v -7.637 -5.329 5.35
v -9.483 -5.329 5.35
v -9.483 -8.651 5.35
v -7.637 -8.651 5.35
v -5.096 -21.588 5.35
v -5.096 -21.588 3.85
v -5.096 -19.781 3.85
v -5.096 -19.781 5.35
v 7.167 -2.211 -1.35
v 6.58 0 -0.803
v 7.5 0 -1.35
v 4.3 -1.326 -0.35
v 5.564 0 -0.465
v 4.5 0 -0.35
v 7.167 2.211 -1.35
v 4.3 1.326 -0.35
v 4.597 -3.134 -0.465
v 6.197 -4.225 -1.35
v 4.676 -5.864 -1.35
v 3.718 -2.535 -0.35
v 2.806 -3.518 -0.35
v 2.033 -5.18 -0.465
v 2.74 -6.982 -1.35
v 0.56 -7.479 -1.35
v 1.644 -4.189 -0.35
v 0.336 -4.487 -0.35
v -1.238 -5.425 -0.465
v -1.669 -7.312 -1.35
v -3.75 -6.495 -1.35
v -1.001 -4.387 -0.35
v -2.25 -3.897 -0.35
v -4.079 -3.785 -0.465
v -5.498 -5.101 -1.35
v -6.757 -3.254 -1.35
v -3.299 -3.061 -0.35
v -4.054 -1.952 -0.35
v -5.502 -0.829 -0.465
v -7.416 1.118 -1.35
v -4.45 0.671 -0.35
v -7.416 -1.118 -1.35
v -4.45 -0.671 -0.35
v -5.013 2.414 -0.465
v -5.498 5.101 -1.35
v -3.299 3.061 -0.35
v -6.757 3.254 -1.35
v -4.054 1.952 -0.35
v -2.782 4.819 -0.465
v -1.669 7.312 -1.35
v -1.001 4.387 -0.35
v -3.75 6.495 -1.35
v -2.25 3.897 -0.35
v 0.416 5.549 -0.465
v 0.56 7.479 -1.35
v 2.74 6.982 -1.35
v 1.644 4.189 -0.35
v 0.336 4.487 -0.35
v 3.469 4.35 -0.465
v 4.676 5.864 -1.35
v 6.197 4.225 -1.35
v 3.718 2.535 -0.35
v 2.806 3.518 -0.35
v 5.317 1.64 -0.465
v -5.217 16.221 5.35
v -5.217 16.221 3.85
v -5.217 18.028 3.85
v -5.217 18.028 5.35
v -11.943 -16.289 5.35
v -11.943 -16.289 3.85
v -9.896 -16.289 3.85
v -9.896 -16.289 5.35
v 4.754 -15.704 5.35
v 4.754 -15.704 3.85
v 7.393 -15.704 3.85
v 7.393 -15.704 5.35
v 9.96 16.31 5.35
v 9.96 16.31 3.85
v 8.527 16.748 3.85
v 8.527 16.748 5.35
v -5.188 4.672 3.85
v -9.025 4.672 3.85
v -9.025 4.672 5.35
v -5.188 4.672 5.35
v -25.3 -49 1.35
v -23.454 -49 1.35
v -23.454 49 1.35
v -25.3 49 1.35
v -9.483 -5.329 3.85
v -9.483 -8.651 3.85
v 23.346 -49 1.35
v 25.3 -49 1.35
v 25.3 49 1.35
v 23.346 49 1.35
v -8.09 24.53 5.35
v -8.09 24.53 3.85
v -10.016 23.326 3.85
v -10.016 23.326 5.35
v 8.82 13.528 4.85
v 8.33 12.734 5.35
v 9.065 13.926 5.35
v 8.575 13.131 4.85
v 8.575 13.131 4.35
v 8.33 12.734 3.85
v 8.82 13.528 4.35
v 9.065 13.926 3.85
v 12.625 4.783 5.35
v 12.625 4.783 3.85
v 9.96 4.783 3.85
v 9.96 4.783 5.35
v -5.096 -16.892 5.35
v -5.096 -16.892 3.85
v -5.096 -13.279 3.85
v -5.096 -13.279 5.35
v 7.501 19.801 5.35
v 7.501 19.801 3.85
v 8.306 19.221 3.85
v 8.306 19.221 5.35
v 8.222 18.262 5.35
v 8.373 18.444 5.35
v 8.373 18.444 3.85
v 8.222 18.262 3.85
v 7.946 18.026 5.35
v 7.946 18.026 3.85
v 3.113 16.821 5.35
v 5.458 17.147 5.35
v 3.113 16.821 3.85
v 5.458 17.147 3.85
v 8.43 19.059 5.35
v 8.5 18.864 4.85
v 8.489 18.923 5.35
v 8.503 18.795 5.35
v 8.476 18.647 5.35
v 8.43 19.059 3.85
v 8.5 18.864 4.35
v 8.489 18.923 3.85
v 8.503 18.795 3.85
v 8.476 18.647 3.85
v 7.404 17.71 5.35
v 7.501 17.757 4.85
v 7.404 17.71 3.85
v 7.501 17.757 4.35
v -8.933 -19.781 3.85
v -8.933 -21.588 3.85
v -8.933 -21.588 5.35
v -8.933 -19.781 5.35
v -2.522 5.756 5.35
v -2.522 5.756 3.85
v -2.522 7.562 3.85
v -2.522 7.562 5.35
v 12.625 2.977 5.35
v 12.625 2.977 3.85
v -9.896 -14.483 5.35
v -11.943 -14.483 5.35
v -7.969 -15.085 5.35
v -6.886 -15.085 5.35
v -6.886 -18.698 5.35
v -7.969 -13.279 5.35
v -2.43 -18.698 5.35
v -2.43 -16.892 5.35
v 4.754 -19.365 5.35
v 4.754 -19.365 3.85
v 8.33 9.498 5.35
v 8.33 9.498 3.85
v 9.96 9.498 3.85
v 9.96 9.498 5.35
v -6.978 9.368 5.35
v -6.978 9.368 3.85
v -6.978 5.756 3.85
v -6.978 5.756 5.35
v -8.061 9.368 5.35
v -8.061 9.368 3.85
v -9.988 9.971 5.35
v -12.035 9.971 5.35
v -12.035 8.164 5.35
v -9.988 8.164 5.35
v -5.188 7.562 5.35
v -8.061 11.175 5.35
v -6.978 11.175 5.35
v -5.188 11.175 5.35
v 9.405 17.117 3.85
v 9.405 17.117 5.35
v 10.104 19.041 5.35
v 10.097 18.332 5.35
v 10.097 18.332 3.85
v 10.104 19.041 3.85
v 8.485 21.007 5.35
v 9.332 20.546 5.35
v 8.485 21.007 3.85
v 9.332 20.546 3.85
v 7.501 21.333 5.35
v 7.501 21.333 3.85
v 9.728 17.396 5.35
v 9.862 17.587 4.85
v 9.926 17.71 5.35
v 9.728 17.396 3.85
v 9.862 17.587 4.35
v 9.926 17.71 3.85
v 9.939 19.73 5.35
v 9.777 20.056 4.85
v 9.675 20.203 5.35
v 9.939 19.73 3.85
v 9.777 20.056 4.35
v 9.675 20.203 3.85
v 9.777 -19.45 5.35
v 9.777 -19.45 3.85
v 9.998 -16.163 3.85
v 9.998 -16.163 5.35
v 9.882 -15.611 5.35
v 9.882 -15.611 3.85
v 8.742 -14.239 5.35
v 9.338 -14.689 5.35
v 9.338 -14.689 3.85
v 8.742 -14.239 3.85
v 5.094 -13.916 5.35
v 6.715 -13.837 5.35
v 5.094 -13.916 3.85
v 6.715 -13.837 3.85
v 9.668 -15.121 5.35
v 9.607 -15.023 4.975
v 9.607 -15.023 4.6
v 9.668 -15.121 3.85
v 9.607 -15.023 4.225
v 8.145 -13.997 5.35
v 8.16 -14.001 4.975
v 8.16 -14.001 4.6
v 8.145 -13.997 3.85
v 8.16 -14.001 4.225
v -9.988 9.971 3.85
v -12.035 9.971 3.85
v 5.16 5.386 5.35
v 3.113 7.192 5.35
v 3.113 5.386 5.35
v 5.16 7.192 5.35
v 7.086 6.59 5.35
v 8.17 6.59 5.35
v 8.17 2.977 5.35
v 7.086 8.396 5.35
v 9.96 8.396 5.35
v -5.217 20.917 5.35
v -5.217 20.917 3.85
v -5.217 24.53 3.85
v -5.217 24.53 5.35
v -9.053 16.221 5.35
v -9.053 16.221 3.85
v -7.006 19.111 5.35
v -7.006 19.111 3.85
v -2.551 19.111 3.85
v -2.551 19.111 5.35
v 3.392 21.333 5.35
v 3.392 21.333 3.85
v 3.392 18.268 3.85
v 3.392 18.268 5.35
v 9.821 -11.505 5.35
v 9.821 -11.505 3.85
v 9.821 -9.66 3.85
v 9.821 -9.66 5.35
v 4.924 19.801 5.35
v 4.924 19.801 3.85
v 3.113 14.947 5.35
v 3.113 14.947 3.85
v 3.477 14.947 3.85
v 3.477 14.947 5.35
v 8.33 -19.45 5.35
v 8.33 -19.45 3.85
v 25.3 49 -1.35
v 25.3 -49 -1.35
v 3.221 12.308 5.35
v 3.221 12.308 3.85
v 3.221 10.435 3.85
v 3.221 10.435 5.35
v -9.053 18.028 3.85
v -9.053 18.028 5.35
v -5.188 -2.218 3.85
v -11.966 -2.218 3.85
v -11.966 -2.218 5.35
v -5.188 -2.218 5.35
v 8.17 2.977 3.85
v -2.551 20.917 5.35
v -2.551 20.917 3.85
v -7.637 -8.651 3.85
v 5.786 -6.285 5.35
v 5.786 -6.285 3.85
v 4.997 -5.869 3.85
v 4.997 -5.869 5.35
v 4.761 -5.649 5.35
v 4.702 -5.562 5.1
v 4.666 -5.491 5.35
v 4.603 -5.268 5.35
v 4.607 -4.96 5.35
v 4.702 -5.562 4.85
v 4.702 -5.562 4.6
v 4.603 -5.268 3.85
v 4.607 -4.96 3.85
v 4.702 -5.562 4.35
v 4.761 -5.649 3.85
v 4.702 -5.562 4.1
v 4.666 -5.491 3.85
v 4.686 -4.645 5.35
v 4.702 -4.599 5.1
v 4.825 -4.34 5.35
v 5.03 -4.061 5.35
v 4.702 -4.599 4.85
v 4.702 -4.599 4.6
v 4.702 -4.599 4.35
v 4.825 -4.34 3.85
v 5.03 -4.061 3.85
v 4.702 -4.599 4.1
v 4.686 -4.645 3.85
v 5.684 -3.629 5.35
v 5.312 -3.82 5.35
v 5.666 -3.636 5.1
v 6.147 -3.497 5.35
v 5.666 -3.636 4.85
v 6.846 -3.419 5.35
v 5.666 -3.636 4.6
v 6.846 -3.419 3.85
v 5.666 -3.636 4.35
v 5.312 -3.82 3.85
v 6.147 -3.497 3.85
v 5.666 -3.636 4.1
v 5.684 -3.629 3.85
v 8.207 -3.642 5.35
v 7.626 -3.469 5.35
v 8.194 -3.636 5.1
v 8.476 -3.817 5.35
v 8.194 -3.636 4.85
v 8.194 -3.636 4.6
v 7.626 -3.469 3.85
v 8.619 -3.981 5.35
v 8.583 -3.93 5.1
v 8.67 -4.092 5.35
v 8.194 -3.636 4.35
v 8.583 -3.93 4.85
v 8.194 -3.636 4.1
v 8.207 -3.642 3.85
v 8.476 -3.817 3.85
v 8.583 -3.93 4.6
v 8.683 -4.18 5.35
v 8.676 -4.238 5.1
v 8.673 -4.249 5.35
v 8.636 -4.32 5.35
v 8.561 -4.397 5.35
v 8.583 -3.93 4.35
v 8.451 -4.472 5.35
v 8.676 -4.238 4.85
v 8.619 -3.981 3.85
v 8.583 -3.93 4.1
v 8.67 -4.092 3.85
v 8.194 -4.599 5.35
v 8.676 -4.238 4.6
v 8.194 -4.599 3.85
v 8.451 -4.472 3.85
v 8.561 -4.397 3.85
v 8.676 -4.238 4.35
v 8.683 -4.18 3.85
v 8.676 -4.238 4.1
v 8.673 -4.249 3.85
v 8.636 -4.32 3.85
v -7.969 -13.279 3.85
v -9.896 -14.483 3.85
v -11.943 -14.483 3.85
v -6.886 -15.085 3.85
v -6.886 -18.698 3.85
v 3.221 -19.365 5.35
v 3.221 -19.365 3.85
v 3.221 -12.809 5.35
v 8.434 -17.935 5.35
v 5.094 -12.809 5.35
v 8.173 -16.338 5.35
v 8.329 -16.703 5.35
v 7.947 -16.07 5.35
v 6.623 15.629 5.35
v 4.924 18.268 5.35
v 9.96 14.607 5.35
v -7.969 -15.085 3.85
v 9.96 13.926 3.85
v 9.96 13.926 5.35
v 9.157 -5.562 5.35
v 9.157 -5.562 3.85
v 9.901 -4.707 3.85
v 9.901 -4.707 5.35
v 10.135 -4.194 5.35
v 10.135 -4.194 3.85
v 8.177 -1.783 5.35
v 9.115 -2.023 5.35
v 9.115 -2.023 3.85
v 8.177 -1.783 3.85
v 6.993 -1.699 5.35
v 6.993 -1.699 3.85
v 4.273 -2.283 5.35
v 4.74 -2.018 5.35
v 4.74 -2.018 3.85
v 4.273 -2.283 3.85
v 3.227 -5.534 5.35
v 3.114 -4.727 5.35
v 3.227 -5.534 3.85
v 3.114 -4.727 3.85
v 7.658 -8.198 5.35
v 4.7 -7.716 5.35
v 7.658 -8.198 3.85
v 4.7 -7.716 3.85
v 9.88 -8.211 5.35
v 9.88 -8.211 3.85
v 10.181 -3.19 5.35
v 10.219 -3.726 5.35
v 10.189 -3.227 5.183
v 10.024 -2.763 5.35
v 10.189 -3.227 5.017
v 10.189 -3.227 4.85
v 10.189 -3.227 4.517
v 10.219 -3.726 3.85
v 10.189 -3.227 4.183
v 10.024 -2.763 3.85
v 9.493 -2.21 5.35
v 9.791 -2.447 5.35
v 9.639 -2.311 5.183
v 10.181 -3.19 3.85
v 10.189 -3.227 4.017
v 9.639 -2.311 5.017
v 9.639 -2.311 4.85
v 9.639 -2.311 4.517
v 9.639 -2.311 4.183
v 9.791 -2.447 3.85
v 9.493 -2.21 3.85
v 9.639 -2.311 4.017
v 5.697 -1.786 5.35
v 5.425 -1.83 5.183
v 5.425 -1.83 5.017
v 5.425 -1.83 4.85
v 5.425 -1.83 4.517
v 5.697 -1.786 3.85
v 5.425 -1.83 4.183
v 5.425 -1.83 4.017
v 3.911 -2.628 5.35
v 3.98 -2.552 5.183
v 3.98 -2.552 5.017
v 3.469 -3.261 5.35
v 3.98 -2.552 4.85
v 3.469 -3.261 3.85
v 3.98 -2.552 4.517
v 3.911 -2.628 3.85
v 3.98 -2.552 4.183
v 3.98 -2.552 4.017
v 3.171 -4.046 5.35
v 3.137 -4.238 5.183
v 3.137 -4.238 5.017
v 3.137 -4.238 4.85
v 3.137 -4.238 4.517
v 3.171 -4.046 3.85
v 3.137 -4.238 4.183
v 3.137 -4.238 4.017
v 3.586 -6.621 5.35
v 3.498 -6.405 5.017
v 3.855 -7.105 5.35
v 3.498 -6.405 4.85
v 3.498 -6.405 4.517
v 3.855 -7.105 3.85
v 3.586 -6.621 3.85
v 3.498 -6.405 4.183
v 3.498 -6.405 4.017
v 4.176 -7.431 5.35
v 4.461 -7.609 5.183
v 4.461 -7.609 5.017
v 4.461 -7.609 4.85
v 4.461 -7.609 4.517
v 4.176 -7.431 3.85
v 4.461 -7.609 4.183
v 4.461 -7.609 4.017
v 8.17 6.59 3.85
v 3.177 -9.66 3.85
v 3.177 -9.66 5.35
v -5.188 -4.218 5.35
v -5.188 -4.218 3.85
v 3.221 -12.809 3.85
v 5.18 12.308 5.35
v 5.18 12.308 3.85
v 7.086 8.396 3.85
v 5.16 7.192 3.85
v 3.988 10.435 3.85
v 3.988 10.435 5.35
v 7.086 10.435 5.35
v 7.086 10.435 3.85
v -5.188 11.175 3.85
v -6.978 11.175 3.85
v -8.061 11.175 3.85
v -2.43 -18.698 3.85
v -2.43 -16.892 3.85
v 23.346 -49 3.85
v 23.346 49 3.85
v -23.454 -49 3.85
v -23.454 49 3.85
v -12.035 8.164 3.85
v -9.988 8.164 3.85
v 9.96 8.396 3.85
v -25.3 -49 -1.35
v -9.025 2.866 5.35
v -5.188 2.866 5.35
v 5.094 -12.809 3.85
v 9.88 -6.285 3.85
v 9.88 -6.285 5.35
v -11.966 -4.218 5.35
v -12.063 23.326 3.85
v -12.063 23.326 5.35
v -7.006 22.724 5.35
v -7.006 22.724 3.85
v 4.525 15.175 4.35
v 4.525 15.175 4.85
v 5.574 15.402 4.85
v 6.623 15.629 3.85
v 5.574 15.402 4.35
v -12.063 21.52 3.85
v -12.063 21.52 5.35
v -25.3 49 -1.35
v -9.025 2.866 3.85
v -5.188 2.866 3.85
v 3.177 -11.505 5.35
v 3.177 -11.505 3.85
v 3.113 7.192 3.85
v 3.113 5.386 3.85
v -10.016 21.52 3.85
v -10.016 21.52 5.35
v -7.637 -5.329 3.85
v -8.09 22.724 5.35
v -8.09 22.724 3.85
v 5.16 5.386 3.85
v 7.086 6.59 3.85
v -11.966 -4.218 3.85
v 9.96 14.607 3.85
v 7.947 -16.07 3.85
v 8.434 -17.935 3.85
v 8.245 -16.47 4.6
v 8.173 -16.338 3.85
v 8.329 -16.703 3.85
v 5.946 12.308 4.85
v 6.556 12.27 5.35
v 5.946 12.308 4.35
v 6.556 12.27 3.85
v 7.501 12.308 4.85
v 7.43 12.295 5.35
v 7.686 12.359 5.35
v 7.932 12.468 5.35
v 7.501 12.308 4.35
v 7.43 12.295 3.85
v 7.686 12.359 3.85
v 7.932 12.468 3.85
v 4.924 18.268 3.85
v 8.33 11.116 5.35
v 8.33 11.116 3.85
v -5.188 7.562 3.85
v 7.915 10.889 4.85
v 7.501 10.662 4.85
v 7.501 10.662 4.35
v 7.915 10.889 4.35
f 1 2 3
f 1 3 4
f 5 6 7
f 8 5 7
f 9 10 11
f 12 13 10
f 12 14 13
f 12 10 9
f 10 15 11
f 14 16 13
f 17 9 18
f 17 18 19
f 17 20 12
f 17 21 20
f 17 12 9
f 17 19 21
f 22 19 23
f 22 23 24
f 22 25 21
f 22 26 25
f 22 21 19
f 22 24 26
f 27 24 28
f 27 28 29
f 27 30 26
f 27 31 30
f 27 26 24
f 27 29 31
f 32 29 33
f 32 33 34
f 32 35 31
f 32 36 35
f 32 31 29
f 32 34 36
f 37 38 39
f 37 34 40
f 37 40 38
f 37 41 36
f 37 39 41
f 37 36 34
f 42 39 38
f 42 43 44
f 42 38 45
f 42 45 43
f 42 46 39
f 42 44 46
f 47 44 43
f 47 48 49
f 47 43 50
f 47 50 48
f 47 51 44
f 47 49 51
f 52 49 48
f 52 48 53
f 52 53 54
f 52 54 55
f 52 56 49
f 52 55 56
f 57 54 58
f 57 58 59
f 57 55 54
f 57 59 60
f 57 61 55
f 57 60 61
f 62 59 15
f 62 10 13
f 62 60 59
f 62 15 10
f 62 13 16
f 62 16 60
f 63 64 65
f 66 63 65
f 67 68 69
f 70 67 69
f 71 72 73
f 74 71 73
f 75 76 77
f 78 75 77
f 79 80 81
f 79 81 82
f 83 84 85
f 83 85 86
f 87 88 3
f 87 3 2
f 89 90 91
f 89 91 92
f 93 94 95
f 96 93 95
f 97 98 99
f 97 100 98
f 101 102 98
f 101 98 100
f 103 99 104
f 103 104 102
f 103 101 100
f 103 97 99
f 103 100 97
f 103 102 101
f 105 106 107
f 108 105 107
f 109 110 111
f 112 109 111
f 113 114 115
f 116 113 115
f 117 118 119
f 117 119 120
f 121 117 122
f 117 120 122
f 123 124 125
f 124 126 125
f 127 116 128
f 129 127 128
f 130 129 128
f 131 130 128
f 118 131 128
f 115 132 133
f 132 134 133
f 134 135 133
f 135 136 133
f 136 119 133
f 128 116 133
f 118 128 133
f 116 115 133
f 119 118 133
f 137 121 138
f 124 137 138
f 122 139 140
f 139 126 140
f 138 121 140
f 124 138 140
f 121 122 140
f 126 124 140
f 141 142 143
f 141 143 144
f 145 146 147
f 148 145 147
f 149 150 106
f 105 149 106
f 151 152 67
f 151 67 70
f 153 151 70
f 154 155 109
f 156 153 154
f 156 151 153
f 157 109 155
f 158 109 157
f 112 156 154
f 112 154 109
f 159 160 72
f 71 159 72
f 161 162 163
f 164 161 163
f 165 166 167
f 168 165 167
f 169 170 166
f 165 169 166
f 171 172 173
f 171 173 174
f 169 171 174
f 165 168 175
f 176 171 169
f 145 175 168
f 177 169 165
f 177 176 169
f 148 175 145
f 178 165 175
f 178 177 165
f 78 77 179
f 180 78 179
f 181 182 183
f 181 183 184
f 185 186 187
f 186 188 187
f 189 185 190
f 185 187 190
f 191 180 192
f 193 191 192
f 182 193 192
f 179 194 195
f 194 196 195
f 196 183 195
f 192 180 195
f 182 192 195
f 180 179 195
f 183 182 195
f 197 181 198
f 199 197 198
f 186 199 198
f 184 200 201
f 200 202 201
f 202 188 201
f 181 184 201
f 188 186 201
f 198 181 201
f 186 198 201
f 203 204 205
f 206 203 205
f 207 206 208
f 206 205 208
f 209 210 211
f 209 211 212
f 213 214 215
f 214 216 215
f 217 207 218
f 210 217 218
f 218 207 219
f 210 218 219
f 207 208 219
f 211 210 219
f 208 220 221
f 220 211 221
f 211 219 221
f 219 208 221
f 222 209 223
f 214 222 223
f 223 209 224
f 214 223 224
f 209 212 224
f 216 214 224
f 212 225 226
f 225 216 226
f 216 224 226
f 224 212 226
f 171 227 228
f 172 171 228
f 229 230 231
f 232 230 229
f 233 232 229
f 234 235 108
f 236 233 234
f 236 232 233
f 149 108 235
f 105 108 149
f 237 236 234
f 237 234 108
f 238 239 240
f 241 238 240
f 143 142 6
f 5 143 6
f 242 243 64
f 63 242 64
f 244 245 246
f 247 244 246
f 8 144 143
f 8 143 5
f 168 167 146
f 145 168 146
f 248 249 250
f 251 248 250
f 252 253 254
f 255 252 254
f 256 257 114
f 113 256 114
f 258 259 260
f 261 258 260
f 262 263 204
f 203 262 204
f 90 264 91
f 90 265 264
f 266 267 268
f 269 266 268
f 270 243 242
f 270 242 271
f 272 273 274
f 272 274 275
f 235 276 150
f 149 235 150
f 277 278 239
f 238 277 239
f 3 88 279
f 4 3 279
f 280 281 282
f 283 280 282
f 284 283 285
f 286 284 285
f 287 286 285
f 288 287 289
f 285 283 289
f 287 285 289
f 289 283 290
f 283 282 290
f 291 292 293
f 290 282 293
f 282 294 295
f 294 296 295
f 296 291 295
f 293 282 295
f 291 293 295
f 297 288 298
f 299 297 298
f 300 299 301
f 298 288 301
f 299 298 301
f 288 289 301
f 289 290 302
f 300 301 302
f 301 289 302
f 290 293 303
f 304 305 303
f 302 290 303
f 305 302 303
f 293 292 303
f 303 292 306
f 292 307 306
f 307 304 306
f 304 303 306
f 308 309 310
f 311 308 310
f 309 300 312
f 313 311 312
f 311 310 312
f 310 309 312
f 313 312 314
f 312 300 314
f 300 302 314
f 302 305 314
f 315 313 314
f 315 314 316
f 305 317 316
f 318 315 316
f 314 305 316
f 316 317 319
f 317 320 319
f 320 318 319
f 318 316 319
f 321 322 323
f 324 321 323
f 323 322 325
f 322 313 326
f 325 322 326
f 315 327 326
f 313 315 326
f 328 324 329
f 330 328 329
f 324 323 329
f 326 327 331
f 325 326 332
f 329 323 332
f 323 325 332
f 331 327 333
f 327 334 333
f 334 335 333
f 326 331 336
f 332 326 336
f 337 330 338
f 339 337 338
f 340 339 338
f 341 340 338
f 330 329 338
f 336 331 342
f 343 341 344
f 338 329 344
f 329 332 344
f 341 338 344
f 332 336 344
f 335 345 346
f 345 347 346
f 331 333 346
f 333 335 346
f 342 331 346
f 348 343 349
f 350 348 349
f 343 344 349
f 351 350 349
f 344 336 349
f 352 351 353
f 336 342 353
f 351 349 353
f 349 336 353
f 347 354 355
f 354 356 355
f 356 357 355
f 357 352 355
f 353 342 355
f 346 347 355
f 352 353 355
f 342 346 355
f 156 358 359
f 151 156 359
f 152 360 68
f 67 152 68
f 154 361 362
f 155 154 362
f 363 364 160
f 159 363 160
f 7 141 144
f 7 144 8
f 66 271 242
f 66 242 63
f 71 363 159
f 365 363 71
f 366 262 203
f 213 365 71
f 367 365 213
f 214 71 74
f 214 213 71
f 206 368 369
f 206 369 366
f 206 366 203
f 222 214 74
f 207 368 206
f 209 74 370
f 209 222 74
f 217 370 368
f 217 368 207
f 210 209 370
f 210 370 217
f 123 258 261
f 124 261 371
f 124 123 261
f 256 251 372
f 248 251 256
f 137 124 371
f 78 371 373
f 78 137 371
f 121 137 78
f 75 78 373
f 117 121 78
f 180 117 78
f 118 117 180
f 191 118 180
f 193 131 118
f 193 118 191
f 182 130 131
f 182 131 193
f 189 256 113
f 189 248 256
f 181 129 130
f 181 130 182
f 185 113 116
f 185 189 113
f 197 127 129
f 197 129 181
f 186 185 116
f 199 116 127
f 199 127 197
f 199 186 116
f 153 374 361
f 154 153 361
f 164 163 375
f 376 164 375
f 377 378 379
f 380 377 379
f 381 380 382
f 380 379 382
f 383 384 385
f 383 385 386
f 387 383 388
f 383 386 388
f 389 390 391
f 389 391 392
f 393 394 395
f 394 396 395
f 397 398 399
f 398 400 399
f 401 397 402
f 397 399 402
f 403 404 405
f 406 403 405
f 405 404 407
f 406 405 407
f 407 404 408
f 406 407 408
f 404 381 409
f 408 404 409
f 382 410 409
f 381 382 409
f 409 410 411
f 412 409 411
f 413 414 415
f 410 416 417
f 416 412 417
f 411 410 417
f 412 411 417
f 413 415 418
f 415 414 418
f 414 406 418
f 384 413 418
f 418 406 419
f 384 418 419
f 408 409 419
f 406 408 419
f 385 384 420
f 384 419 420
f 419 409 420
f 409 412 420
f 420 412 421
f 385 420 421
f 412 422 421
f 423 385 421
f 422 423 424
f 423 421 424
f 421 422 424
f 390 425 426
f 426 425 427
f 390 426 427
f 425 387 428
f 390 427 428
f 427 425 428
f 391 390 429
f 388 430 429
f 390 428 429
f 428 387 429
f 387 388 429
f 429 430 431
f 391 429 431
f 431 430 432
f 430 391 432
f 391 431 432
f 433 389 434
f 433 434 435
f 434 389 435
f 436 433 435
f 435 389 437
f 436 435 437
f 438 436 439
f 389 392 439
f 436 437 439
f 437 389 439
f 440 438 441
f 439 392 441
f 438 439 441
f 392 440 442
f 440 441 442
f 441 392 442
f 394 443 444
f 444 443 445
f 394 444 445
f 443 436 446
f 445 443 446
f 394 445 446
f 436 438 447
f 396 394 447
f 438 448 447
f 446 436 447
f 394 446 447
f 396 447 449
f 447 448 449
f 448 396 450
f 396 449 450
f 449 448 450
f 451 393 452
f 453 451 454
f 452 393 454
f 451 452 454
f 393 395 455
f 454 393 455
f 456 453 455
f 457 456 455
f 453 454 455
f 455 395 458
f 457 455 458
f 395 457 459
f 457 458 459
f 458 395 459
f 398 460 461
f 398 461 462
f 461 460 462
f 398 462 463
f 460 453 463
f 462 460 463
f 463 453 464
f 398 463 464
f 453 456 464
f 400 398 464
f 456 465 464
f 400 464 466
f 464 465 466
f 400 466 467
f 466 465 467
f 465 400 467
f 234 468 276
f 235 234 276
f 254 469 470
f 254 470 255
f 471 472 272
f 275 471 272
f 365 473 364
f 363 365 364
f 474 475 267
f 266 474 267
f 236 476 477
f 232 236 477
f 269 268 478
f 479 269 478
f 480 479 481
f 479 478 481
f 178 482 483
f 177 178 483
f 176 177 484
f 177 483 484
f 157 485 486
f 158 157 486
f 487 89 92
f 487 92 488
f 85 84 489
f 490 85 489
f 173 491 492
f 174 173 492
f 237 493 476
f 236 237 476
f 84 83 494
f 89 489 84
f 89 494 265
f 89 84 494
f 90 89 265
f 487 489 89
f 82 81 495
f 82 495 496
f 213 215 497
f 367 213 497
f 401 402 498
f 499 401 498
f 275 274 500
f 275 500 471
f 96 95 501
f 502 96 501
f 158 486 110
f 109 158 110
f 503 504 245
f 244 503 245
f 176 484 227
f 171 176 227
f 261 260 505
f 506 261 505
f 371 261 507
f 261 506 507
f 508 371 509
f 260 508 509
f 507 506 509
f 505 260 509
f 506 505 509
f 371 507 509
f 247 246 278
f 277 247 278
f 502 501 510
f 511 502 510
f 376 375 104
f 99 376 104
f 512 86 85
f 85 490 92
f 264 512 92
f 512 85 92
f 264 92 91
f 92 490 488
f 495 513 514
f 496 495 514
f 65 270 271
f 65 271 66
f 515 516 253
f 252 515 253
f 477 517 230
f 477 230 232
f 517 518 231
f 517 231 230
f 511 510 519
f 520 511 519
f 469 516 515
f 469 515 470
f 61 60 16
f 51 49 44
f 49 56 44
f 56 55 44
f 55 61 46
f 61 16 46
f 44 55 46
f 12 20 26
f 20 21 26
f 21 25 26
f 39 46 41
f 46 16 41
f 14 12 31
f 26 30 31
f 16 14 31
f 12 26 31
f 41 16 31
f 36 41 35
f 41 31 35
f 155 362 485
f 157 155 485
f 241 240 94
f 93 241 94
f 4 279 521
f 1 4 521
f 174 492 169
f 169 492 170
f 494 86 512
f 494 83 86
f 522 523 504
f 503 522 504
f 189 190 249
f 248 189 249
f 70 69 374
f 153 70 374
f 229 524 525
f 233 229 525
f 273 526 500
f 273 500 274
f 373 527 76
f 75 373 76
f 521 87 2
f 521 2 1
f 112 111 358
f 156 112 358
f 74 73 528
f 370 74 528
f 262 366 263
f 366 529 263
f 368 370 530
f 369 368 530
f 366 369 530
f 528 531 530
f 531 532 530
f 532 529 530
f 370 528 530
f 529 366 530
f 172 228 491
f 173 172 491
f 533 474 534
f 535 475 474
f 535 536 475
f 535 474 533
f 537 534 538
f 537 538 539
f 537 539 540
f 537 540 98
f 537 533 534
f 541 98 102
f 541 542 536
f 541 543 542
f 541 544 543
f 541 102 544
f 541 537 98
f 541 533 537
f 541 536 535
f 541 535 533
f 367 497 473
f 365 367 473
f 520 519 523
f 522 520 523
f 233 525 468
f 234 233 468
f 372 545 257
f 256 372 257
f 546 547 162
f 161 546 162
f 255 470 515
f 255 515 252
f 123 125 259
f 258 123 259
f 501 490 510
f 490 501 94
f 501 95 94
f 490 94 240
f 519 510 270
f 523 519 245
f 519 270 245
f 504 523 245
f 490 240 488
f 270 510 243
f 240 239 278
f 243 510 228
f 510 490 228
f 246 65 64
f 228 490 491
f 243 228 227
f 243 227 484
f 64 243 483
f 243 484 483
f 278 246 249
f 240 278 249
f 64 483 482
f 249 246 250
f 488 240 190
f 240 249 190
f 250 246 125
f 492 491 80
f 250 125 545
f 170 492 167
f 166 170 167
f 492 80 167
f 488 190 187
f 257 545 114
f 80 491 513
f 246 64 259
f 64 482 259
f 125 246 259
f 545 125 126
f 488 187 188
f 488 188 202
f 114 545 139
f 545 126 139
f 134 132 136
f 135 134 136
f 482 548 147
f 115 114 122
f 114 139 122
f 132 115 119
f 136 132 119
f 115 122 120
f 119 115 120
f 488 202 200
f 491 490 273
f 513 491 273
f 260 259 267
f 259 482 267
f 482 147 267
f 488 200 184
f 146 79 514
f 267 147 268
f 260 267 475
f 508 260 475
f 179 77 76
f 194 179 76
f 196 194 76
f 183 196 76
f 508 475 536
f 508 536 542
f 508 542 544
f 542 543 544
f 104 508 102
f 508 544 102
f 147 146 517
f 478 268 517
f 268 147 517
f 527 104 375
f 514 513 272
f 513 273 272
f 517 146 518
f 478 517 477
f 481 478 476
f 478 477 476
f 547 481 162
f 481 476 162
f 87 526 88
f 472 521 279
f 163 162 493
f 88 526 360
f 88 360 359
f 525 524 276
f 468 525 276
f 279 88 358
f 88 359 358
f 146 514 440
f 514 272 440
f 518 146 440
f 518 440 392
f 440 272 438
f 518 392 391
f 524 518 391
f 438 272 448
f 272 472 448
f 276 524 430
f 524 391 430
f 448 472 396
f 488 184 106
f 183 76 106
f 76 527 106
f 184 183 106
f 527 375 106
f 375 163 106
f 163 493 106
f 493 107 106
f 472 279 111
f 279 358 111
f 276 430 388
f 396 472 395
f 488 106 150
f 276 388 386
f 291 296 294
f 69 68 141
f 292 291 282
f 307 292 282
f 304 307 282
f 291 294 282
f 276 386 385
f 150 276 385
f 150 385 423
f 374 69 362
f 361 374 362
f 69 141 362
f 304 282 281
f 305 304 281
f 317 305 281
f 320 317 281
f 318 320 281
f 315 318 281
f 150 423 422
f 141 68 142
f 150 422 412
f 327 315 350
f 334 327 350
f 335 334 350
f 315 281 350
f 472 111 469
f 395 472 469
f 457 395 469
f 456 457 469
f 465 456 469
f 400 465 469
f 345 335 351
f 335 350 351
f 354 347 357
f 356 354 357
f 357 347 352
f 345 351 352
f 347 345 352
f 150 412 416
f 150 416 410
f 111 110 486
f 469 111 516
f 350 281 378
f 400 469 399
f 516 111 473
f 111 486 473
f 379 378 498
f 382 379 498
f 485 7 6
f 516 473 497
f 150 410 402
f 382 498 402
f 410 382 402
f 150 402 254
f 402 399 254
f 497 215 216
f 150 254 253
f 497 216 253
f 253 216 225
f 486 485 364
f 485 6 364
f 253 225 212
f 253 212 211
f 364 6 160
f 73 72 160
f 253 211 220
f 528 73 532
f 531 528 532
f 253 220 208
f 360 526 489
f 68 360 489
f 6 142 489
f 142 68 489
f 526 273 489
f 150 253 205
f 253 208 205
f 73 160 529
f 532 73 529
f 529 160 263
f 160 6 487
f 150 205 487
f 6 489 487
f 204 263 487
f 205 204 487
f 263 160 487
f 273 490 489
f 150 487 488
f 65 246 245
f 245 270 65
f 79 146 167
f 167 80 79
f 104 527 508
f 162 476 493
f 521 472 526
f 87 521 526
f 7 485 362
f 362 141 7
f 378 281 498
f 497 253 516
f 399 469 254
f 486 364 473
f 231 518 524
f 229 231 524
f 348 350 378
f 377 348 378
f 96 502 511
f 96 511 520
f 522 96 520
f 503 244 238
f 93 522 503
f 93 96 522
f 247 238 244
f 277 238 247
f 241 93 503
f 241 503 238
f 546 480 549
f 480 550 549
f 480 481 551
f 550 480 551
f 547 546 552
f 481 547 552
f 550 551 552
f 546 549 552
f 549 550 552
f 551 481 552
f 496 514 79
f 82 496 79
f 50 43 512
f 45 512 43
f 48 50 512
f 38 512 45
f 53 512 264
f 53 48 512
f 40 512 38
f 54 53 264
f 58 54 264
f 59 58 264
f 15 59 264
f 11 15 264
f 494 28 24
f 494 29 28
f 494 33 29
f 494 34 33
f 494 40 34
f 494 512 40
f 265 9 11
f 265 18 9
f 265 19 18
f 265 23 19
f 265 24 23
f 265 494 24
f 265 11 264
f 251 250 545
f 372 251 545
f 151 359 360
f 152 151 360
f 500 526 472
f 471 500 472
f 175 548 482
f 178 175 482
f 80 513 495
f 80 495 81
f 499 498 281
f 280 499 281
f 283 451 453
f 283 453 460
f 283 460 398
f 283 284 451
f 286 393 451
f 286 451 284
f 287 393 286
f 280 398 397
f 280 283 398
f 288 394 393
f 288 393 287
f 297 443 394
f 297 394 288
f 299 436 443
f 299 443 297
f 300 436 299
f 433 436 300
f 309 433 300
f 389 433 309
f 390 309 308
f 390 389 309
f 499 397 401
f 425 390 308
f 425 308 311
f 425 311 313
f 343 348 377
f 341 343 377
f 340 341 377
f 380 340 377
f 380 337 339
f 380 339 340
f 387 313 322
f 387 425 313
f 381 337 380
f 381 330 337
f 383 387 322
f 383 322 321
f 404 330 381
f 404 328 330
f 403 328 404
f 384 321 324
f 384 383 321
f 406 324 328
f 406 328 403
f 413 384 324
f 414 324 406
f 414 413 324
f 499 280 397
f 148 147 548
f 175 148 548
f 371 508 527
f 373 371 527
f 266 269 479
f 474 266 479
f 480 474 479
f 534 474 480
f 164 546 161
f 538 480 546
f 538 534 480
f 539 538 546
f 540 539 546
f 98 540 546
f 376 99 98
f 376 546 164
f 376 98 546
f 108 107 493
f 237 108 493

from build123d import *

# Parameters (mm, degrees)
F0_W     = 46.8
F0_H     = 2.5
F1_DEPTH = 49
F2_W     = 7.5
F2_H     = 1
F5_W     = 2.0469846204
F5_H     = 1.8061620649
F5_W_2   = 6.6439194979
F5_H_2   = 1.8455331939
F5_W_3   = 3.8363870533
F5_H_3   = 1.8061622977
F5_W_4   = 1.0836967267
F5_W_5   = 6.7777763455
F5_H_4   = 2
F5_W_6   = 1.8455331939
F5_H_5   = 3.3219597489
F6_DEPTH = 1.5


# Not quite as in the source:
# - a fillet or chamfer that OpenCascade refuses, or shapes differently, is made with other operations: its cross-section is extruded or revolved along the edge and cut away or added


with BuildPart() as f1:
    # F0 (on Front) → F1 (new body, symmetric)
    with BuildSketch(Plane.XZ):
        Polygon((25.3, -1.35), (25.3, 1.35), (23.3460554371, 1.35), (-23.4539445629, 1.35), (-25.3, 1.35), (-25.3, -1.35), align=None)
        with Locations((-0.0539445629, 2.6)):
            Rectangle(F0_W, F0_H)
    extrude(amount=F1_DEPTH, both=True)

    # F2 (on Front) → F3 (revolve, cut)
    with BuildSketch(Plane.XZ):
        with Locations((3.75, -0.85)):
            Rectangle(F2_W, F2_H)
    revolve(axis=Axis((0, 0, -0.85), (0, 0, -1)), mode=Mode.SUBTRACT)

    # F4: fillet of radius 5 on 1 edges, made by hand

    # F4_s1 → F4_t2 (revolve)
    with BuildSketch(Plane.XZ):
        with BuildLine():
            ThreePointArc((7.5, -1.35), (6.0811388301, -0.6065835097), (4.5, -0.35))
            Line((4.5, -0.35), (7.5, -0.35))
            Line((7.5, -0.35), (7.5, -1.35))
        make_face()
    revolve(axis=Axis((0, 0, -0.35), (0, 0, -1)))

    # F5 (on face) → F6 (join)
    with BuildSketch(Plane.XY.offset(3.85)):
        with BuildLine():
            Line((4.9241716042, 19.8006471619), (7.5009630335, 19.8006471619))
            add(Edge.make_bspline(
                [(7.5009630335, 19.8006471619), (7.9785124596, 19.5075781217), (8.9543671976, 18.9087022865), (7.3816458851, 17.3276064651), (4.7697273037, 17.0174018652), (3.1129348501, 16.8206328526)],
                knots=[0, 0, 0, 0, 0.2595051335, 0.5302892228, 1, 1, 1, 1], degree=3))
            Line((3.1129348501, 16.8206328526), (3.1129348501, 14.9474805221))
            Line((3.1129348501, 14.9474805221), (3.4767354373, 14.9474805221))
            add(Edge.make_bspline(
                [(3.4767354373, 14.9474805221), (4.5253869977, 15.1745288943), (5.5740385582, 15.4015772666), (6.6226901187, 15.6286256388)],
                knots=[0, 0, 0, 0, 3.2188490998, 3.2188490998, 3.2188490998, 3.2188490998], degree=3))
            Line((6.6226901187, 15.6286256388), (9.9595930205, 14.6069070324))
            Line((9.9595930205, 14.6069070324), (9.9595930205, 16.3097716868))
            Line((9.9595930205, 16.3097716868), (8.527294053, 16.7483240055))
            add(Edge.make_bspline(
                [(8.527294053, 16.7483240055), (9.0505266558, 16.9185557016), (10.2287332466, 17.301880642), (10.2116405832, 20.5168892904), (8.4127583201, 21.0586346497), (7.5009630335, 21.3332278654)],
                knots=[0, 0, 0, 0, 0.2826109345, 0.6363786658, 1, 1, 1, 1], degree=3))
            Line((7.5009630335, 21.3332278654), (3.3915922977, 21.3332278654))
            Line((3.3915922977, 21.3332278654), (3.3915922977, 18.2680701837))
            Line((3.3915922977, 18.2680701837), (4.9241716042, 18.2680701837))
            Line((4.9241716042, 18.2680701837), (4.9241716042, 19.8006471619))
        make_face()
        with BuildLine():
            Line((5.1796017215, 12.3080369085), (3.2213055529, 12.3080369085))
            Line((3.2213055529, 12.3080369085), (3.2213055529, 10.434884578))
            Line((3.2213055529, 10.434884578), (3.987595439, 10.434884578))
            add(Edge.make_bspline(
                [(7.0864924639, 10.434884578), (6.6226901187, 10.434884578), (5.6548767314, 10.434884578), (4.5585386607, 10.434884578), (3.987595439, 10.434884578)],
                knots=[0, 0, 0, 0, 0.4792270404, 1, 1, 1, 1], degree=3))
            add(Edge.make_bspline(
                [(7.0864924639, 10.434884578), (7.5009630335, 10.6619332607), (7.915433603, 10.8889819433), (8.3299041726, 11.116030626)],
                knots=[0, 0, 0, 0, 1.4177561906, 1.4177561906, 1.4177561906, 1.4177561906], degree=3))
            Line((8.3299041726, 11.116030626), (8.3299041726, 12.7337537706))
            add(Edge.make_bspline(
                [(5.1796017215, 12.3080369085), (5.4034691903, 12.3161910935), (5.946247887, 12.3359613528), (7.5456770883, 12.1555160266), (8.0916682054, 12.558094155), (8.3299041726, 12.7337537706)],
                knots=[0, 0, 0, 0, 0.2835019002, 0.6873655771, 1, 1, 1, 1], degree=3))
        make_face()
        with BuildLine():
            add(Edge.make_bspline(
                [(8.3299041726, 12.7337537706), (8.5748998169, 13.1310888877), (8.8198954612, 13.5284240047), (9.0648911056, 13.9257591218)],
                knots=[0, 0, 0, 0, 1.4003865712, 1.4003865712, 1.4003865712, 1.4003865712], degree=3))
            Line((8.3299041726, 12.7337537706), (8.3299041726, 11.116030626))
            Line((8.3299041726, 11.116030626), (8.3299041726, 9.4983074814))
            Line((8.3299041726, 9.4983074814), (9.0648911056, 9.4983074814))
            Line((9.0648911056, 9.4983074814), (9.9595930205, 9.4983074814))
            Line((9.9595930205, 9.4983074814), (9.9595930205, 13.9257591218))
            Line((9.9595930205, 13.9257591218), (9.0648911056, 13.9257591218))
        make_face()
        Polygon((8.1701891906, 8.3958084671), (7.0864924639, 8.3958084671), (5.1599194705, 7.1917017432), (5.1599194705, 5.3855396783), (7.0864924639, 6.5896464022), (8.1701891906, 6.5896464022), align=None)
        with Locations((4.1364271603, 6.2886207107)):
            Rectangle(F5_W, F5_H)
        Polygon((9.9595930205, 8.3958084671), (8.1701891906, 8.3958084671), (8.1701891906, 6.5896464022), (8.1701891906, 4.7834843373), (9.9595930205, 4.7834843373), align=None)
        Polygon((12.62538982, 4.7834843373), (9.9595930205, 4.7834843373), (8.1701891906, 4.7834843373), (8.1701891906, 2.9773220395), (12.62538982, 2.9773220395), align=None)
        with BuildLine():
            Line((8.1941955723, -4.5991633087), (9.157482069, -5.5624498054))
            add(Edge.make_bspline(
                [(9.157482069, -5.5624498054), (9.5487792454, -5.1790893624), (10.3709560961, -4.3735888355), (10.1809148183, -1.5911495575), (5.2901881268, -1.6214904462), (3.9387879664, -2.4019349259), (2.8327143669, -4.2152866088), (3.4405306211, -6.4549250287), (4.2493320025, -7.9388718891), (8.0091011439, -8.2673740434), (9.3225151381, -8.2281395815), (9.8799471743, -8.2114879042)],
                knots=[0, 0, 0, 0, 0.0955972377, 0.2008648172, 0.3547140558, 0.449658727, 0.5522106806, 0.6629402054, 0.7557007662, 0.8963158456, 1, 1, 1, 1], degree=3))
            Line((9.8799471743, -8.2114879042), (9.8799471743, -6.2849144451))
            Line((9.8799471743, -6.2849144451), (9.639125783, -6.2849144451))
            Line((9.639125783, -6.2849144451), (5.7859793305, -6.2849144451))
            add(Edge.make_bspline(
                [(5.7859793305, -6.2849144451), (5.3373815573, -6.0824238319), (4.5029895973, -5.7057912452), (4.6151304787, -4.5054927526), (5.5221677114, -3.357555761), (8.2143823017, -3.3336799886), (8.8829973904, -4.2841414137), (8.4141443171, -4.4985702665), (8.1941955723, -4.5991633087)],
                knots=[0, 0, 0, 0, 0.1746613826, 0.3248702113, 0.5034996406, 0.7468657523, 0.8812494506, 1, 1, 1, 1], degree=3))
        make_face()
        with Locations((6.4990330953, -10.5825328623)):
            Rectangle(F5_W_2, F5_H_2)
        with BuildLine():
            Line((5.094458349, -12.8092374653), (3.2213055529, -12.8092374653))
            Line((3.2213055529, -12.8092374653), (3.2213055529, -19.3652724847))
            Line((3.2213055529, -19.3652724847), (4.753885325, -19.3652724847))
            Line((4.753885325, -19.3652724847), (4.753885325, -15.7041111961))
            Line((4.753885325, -15.7041111961), (7.393327076, -15.7041111961))
            add(Edge.make_bspline(
                [(7.393327076, -15.7041111961), (7.7280745564, -15.8906025071), (8.6028551514, -16.3779518959), (8.4340893146, -18.2776591394), (8.3299041726, -19.4504158571)],
                knots=[0, 0, 0, 0, 0.3826645017, 1, 1, 1, 1], degree=3))
            Line((8.3299041726, -19.4504158571), (9.777339641, -19.4504158571))
            add(Edge.make_bspline(
                [(9.777339641, -19.4504158571), (9.916282957, -18.4574178062), (10.1622140126, -16.6998013476), (9.7862090494, -14.9229979542), (8.1515194, -13.6961261057), (6.2020376655, -13.8364032587), (5.094458349, -13.9161003754)],
                knots=[0, 0, 0, 0, 0.2773941316, 0.4909903808, 0.7108110755, 1, 1, 1, 1], degree=3))
            Line((5.094458349, -13.9161003754), (5.094458349, -12.8092374653))
        make_face()
        Polygon((-8.0897600321, 22.7236154125), (-7.0060633053, 22.7236154125), (-7.0060633053, 24.5297774774), (-8.0897600321, 24.5297774774), (-10.0163330255, 23.3256707535), (-12.0633176458, 23.3256707535), (-12.0633176458, 21.5195086886), (-10.0163330255, 21.5195086886), align=None)
        Polygon((-7.0060633053, 20.9174533476), (-5.2166594755, 20.9174533476), (-5.2166594755, 24.5297774774), (-7.0060633053, 24.5297774774), (-7.0060633053, 22.7236154125), align=None)
        Polygon((-7.0060633053, 19.1112910499), (-2.550862676, 19.1112910499), (-2.550862676, 20.9174533476), (-5.2166594755, 20.9174533476), (-7.0060633053, 20.9174533476), align=None)
        with Locations((-7.1348530021, 17.1245136399)):
            Rectangle(F5_W_3, F5_H_3)
        Polygon((-9.9878371693, 8.1643839367), (-8.0612641759, 9.3684906606), (-8.0612641759, 11.1746527255), (-9.9878371693, 9.9705460016), (-12.0348217897, 9.9705460016), (-12.0348217897, 8.1643839367), align=None)
        with Locations((-7.5194158126, 10.271571693)):
            Rectangle(F5_W_4, F5_H)
        Polygon((-6.9775674492, 9.3684906606), (-6.9775674492, 7.5623285957), (-5.1881636194, 7.5623285957), (-5.1881636194, 11.1746527255), (-6.9775674492, 11.1746527255), align=None)
        Polygon((-6.9775674492, 5.7561662979), (-2.5223668199, 5.7561662979), (-2.5223668199, 7.5623285957), (-5.1881636194, 7.5623285957), (-6.9775674492, 7.5623285957), align=None)
        with Locations((-7.106357146, 3.769388888)):
            Rectangle(F5_W_3, F5_H_3)
        with Locations((-8.5770517921, -3.2183615263)):
            Rectangle(F5_W_5, F5_H_4)
        with Locations((-8.560137578, -6.9900213829)):
            Rectangle(F5_W_6, F5_H_5)
        Polygon((-7.969349802, -15.0853700369), (-6.8856530753, -15.0853700369), (-6.8856530753, -13.279207972), (-7.969349802, -13.279207972), (-9.8959227954, -14.4833146959), (-11.9429074158, -14.4833146959), (-11.9429074158, -16.2894767608), (-9.8959227954, -16.2894767608), align=None)
        Polygon((-6.8856530753, -15.0853700369), (-6.8856530753, -16.8915321018), (-5.0962492455, -16.8915321018), (-5.0962492455, -13.279207972), (-6.8856530753, -13.279207972), align=None)
        Polygon((-6.8856530753, -18.6976943995), (-2.430452446, -18.6976943995), (-2.430452446, -16.8915321018), (-5.0962492455, -16.8915321018), (-6.8856530753, -16.8915321018), align=None)
        with Locations((-7.0144427721, -20.6844718094)):
            Rectangle(F5_W_3, F5_H_3)
    extrude(amount=F6_DEPTH)


solid = f1.part
